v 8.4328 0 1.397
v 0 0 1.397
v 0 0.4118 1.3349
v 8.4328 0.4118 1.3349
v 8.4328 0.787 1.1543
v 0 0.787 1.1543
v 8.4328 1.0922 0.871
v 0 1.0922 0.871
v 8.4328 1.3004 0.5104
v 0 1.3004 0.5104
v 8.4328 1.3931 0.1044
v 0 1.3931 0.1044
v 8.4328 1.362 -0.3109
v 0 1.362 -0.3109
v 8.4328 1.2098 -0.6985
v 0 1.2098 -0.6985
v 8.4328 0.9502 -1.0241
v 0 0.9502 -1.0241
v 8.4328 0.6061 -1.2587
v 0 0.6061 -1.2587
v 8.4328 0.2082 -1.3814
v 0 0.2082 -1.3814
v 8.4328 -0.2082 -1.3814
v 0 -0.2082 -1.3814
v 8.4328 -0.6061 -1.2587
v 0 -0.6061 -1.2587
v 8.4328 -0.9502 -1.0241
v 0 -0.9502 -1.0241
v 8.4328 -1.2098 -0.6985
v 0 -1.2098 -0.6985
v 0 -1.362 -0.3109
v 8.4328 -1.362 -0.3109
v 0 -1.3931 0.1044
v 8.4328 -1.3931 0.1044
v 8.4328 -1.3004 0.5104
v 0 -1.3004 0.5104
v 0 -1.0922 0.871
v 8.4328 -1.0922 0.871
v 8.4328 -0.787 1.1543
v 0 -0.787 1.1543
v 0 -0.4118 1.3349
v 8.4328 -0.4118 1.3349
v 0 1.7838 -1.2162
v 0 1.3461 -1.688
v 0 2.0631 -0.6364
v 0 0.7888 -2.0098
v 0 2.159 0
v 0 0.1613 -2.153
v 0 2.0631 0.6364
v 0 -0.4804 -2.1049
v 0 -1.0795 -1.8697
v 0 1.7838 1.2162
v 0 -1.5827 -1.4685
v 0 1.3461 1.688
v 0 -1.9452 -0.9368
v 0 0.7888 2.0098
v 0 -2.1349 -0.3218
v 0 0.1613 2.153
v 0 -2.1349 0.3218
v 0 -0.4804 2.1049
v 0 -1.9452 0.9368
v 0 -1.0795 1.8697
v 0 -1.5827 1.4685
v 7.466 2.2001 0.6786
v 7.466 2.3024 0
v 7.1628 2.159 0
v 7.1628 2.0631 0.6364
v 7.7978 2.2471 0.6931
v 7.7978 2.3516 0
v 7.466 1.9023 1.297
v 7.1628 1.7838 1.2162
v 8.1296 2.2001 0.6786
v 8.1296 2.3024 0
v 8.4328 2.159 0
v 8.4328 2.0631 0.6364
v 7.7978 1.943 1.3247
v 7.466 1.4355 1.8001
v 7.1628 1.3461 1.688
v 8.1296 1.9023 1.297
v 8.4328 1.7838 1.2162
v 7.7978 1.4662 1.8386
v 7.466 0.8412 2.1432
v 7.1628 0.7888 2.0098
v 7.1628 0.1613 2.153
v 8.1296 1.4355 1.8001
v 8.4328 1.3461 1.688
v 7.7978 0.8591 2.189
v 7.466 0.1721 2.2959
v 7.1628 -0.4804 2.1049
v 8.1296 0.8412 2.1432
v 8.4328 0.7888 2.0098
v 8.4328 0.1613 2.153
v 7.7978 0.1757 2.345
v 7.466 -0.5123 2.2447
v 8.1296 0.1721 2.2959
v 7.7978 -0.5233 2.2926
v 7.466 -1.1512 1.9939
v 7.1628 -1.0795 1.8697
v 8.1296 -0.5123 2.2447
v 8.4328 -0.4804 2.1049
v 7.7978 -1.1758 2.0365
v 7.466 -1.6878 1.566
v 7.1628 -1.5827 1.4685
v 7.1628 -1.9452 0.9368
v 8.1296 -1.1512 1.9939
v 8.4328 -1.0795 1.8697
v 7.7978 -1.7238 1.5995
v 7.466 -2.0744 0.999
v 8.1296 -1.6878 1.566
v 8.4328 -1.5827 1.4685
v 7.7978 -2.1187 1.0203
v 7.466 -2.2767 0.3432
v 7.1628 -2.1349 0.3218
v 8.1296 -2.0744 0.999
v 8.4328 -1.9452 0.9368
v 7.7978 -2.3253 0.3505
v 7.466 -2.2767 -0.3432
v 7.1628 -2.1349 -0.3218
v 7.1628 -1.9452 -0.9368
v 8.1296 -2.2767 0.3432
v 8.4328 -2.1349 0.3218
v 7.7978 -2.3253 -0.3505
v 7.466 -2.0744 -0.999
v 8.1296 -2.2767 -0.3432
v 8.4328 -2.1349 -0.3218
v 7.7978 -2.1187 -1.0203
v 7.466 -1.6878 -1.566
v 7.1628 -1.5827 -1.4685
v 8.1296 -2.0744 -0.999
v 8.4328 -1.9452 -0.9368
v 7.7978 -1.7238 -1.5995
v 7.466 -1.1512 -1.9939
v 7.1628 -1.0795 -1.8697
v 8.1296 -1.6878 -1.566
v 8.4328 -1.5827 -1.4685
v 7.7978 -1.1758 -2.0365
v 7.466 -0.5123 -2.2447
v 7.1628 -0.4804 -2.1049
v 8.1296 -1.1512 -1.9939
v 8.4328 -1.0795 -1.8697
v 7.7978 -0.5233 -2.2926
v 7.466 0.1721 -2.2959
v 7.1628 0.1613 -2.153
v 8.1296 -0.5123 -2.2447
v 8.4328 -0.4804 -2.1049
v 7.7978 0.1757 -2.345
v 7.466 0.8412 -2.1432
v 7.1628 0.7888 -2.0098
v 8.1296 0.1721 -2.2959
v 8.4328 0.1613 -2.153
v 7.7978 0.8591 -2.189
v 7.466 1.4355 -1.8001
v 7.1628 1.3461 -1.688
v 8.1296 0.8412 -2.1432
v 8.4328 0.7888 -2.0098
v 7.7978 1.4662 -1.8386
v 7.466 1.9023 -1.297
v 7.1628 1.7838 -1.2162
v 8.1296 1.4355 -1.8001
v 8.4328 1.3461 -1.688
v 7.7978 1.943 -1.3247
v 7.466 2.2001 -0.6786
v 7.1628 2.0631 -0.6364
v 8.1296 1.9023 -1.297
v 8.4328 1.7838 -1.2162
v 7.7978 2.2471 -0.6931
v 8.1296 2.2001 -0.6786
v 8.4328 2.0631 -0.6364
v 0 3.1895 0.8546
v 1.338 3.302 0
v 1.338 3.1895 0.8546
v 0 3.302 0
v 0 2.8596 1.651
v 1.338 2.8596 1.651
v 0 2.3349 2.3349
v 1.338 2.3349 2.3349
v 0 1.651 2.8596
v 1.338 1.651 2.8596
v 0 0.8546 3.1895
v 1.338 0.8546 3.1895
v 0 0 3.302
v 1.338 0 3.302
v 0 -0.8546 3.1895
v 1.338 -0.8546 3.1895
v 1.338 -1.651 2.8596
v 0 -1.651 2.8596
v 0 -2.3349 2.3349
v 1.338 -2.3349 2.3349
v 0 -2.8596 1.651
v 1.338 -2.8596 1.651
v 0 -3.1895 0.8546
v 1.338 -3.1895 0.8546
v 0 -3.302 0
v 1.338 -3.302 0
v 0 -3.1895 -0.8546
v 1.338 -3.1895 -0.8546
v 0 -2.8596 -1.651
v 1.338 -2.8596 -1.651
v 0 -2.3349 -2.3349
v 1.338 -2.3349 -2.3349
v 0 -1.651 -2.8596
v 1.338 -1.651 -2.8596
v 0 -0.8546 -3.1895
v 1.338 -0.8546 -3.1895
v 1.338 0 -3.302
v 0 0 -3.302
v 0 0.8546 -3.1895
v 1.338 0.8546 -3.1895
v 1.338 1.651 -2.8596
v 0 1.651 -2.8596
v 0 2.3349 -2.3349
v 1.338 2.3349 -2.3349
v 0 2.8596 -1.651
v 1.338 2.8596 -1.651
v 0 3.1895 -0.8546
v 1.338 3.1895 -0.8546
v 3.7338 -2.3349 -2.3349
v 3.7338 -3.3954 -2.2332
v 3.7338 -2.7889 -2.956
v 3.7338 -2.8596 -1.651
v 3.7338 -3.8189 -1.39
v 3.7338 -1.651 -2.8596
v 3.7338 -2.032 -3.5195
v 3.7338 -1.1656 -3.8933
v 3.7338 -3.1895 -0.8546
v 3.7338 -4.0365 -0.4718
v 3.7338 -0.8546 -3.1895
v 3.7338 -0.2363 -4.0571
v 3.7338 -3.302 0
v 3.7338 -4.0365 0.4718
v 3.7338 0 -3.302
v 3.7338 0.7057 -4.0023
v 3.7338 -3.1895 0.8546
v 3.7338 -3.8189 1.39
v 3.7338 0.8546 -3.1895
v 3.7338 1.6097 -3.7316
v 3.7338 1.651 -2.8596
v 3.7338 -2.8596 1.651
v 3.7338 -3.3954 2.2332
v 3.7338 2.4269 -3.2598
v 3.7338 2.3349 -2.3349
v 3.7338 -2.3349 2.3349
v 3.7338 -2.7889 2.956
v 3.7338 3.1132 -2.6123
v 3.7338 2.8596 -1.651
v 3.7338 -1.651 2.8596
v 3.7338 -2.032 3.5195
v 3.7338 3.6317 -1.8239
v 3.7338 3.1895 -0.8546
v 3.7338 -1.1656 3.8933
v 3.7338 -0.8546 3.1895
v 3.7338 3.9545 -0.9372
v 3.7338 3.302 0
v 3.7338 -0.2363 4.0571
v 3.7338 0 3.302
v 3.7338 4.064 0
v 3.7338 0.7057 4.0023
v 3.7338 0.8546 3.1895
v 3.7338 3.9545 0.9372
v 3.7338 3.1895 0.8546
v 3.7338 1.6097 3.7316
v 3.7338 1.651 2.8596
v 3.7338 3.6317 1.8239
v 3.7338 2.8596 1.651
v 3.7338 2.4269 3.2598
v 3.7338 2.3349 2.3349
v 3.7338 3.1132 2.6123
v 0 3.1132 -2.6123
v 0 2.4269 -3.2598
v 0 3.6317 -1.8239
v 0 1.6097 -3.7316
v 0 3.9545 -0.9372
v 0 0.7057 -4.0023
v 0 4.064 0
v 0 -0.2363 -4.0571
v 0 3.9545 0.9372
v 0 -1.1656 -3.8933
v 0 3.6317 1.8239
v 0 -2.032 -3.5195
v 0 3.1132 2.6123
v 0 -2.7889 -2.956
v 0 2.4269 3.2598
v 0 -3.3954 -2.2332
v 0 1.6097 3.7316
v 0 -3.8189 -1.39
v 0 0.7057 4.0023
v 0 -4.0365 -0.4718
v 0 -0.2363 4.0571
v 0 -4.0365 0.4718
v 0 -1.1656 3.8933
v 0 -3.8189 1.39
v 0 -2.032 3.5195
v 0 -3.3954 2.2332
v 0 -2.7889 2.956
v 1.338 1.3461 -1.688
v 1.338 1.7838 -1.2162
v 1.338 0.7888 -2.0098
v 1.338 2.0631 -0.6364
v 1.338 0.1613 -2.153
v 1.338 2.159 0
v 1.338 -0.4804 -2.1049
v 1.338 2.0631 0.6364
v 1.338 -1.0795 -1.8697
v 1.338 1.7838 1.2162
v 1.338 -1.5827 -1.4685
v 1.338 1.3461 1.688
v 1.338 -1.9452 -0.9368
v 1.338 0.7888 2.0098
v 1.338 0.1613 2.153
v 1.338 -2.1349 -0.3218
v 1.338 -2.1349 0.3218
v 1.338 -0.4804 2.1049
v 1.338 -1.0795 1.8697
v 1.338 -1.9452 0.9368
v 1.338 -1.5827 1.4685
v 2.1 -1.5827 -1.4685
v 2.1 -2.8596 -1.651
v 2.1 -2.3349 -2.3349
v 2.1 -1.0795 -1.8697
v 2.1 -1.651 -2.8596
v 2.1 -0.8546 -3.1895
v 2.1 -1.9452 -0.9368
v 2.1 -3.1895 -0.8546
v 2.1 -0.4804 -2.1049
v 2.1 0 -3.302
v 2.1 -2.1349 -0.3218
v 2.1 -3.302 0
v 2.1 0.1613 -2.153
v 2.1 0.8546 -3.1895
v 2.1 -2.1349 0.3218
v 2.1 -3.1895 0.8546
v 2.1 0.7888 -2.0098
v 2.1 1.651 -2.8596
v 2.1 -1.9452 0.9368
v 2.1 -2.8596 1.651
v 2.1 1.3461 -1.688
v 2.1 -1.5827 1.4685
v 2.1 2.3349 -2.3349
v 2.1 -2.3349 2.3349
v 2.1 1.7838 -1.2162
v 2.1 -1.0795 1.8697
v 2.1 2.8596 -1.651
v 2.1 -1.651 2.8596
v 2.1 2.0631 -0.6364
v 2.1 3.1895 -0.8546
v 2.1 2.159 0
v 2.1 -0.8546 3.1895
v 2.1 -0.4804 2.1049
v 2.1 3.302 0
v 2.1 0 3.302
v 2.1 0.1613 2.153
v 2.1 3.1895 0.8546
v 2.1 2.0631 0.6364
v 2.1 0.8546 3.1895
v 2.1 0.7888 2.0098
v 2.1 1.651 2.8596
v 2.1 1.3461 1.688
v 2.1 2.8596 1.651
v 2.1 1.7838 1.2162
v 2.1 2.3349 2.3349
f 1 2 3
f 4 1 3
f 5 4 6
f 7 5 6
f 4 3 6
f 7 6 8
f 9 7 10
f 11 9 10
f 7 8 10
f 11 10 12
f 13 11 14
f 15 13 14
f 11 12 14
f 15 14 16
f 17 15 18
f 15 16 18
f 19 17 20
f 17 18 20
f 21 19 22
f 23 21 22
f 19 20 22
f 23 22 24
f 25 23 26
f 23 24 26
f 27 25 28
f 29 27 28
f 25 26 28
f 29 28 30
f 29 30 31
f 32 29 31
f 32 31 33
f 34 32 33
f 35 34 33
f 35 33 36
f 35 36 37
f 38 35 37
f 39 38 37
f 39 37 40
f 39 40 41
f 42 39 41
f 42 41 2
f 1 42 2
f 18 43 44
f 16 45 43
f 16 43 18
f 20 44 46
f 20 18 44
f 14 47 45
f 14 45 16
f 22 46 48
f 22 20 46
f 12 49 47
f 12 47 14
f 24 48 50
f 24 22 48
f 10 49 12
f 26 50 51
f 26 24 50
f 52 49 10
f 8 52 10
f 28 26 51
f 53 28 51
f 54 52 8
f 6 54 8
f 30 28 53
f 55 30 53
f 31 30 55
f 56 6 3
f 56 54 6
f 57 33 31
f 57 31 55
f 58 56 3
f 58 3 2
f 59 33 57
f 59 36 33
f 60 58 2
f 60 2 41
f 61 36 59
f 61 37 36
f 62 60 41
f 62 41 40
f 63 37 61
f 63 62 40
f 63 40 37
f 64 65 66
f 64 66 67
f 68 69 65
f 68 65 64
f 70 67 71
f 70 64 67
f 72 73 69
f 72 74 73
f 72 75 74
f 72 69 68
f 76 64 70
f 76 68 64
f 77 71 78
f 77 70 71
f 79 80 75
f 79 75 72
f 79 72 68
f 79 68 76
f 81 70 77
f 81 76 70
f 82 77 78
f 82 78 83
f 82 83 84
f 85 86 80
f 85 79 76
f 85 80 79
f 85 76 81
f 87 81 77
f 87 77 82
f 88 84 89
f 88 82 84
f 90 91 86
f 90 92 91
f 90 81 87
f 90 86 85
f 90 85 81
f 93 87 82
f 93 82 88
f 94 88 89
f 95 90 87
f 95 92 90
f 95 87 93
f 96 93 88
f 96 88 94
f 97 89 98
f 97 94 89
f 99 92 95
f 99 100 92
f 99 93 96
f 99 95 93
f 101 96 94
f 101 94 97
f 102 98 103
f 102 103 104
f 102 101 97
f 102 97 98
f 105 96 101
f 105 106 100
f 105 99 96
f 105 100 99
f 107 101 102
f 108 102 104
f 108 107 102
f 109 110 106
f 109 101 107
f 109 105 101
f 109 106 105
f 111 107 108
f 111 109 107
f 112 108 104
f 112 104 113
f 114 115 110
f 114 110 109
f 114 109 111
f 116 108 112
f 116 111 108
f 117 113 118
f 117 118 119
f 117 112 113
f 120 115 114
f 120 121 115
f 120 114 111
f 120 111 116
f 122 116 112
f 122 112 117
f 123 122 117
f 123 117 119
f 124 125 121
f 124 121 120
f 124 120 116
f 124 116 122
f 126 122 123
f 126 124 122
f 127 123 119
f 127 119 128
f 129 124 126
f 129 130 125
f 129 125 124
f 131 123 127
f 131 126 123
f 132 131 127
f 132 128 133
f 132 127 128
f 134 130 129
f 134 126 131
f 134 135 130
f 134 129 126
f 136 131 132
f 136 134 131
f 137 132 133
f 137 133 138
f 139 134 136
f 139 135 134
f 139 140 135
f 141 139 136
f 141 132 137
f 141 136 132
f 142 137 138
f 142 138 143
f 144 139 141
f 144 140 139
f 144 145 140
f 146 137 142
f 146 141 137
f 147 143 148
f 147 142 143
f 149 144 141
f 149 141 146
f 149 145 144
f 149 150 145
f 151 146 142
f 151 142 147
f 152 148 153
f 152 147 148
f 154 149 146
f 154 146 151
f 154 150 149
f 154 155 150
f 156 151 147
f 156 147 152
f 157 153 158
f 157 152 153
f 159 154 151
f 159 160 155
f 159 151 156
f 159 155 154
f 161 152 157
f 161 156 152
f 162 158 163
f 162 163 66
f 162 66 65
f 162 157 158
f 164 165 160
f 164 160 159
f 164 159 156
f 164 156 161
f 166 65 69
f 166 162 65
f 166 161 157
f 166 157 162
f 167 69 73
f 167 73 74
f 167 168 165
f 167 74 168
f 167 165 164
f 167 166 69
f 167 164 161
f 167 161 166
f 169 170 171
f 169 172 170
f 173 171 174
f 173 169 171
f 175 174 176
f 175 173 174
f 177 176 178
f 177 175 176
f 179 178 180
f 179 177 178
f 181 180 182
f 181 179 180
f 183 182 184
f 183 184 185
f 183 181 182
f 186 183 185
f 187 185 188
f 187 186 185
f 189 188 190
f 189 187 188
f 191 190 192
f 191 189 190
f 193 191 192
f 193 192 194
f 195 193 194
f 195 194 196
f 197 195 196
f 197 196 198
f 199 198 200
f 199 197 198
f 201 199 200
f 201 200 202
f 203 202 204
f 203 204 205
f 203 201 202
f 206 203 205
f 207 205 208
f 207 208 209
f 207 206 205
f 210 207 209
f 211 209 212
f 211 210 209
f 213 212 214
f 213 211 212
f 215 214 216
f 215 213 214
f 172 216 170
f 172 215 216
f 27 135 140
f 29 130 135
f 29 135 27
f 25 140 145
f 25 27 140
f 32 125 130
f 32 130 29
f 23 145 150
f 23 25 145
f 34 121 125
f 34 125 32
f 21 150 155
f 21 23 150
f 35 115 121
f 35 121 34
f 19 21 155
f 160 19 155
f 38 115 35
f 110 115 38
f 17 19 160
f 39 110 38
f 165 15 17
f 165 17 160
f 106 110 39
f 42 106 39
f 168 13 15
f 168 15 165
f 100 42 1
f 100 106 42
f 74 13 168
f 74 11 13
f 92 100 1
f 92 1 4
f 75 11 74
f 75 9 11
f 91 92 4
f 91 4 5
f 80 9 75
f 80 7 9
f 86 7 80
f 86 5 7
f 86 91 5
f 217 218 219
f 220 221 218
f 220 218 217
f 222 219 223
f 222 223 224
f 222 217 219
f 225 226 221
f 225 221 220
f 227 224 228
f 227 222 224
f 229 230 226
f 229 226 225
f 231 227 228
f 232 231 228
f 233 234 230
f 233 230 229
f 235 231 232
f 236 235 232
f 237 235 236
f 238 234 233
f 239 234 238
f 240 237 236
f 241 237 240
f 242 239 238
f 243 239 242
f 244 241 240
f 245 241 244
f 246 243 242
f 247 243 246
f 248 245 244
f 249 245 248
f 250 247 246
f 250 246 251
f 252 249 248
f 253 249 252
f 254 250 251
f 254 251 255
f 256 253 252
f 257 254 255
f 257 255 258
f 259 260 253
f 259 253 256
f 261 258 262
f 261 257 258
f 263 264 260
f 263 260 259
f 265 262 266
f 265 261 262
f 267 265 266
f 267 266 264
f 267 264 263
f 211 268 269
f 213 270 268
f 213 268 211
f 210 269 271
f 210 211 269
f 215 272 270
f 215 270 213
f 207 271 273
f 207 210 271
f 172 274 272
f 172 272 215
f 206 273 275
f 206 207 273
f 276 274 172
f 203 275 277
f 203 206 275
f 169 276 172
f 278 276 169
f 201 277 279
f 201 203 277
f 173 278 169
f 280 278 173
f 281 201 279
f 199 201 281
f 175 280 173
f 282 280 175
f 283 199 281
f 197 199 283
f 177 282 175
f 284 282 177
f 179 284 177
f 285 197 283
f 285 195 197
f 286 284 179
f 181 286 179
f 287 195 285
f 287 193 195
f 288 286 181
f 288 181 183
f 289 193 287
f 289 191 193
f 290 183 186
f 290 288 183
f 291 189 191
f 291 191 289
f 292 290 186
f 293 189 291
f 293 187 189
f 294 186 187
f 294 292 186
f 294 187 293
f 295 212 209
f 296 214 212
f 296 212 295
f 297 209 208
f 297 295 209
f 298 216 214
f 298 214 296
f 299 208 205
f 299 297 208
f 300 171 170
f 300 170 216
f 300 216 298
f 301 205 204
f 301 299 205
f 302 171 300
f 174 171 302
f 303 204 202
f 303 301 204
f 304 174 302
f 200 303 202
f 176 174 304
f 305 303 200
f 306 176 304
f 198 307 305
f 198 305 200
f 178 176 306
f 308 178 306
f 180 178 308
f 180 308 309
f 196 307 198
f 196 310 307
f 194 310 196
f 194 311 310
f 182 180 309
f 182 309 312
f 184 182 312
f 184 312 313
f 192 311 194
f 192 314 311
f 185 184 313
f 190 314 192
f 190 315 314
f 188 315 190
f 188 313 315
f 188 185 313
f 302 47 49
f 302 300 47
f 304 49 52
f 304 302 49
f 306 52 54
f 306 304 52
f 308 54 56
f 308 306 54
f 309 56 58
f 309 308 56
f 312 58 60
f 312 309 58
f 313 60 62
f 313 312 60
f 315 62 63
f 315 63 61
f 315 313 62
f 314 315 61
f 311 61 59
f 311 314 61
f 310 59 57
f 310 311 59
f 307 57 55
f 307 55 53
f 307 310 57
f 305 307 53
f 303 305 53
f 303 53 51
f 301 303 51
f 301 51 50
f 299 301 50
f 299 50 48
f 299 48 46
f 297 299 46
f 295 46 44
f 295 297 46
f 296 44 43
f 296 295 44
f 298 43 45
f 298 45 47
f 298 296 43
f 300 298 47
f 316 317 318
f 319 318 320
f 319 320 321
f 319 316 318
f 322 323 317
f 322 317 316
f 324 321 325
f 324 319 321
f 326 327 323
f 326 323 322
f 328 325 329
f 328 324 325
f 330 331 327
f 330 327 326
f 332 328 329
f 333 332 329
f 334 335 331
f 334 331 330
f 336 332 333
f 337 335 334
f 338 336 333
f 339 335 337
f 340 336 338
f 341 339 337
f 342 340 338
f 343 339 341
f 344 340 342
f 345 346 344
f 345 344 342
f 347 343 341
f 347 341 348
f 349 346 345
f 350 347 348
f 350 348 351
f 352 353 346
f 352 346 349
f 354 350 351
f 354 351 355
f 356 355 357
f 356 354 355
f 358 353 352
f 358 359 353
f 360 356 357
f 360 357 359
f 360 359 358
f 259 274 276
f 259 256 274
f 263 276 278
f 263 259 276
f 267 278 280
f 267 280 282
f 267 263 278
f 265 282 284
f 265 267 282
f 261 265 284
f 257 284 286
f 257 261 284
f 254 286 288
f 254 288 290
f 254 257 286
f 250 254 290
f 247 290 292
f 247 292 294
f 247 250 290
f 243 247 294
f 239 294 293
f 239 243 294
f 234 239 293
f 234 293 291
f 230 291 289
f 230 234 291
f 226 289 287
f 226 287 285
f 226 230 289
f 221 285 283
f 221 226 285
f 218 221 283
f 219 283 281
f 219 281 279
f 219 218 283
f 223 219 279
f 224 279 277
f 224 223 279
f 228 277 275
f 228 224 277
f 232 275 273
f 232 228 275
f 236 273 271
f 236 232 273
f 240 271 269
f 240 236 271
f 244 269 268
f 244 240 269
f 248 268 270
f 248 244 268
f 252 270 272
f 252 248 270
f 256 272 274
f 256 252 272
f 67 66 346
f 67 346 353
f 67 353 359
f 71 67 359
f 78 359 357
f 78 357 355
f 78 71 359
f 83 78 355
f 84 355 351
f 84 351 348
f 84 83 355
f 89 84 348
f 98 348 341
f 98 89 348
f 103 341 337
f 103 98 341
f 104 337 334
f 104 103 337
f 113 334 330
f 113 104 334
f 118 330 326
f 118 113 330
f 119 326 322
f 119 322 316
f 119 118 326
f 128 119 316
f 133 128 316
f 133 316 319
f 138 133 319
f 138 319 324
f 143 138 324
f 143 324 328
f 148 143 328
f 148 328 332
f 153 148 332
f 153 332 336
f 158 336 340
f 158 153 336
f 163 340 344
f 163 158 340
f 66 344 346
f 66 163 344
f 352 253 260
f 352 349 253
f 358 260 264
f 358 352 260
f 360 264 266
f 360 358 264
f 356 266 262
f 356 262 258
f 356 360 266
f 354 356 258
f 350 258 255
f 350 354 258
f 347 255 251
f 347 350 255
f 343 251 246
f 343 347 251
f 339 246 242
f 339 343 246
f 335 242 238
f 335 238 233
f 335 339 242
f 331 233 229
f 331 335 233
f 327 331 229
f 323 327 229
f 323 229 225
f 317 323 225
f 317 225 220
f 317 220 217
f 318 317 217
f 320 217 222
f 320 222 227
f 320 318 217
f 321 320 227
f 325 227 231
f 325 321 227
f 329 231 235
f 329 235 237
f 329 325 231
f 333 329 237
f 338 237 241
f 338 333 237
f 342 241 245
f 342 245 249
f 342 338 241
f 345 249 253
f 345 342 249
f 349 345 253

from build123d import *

# Parameters (mm, degrees)
SKETCH2_R          = 1.397
CUT_EXTRUDE1_DEPTH = 9.4328


with BuildPart() as part:
    # Sketch1 → Revolve1 (revolve)
    with BuildSketch(Plane.XY):
        Polygon((0, 0), (0, 2.159), (1.337955167, 2.159), (1.337955167, 3.302), (0, 3.302), (0, 4.064), (3.7338, 4.064), (3.7338, 3.302), (2.099955167, 3.302), (2.099955167, 2.159), (8.4328, 2.159), (8.4328, 0), align=None)
    revolve(axis=Axis((0, 0, 0), (1, 0, 0)))

    # Sketch2 → Cut-Extrude1 (cut, through all)
    with BuildSketch(Plane.ZY):
        Circle(SKETCH2_R)
    extrude(amount=-CUT_EXTRUDE1_DEPTH, mode=Mode.SUBTRACT)

    # Sketch3 → Revolve2 (revolve)
    with BuildSketch(Plane.XY):
        with BuildLine():
            Line((8.4328, 2.159), (7.1628, 2.159))
            ThreePointArc((7.1628, 2.159), (7.7978, 2.351594416), (8.4328, 2.159))
        make_face()
    revolve(axis=Axis((0, 0, 0), (1, 0, 0)))


solid = part.part
